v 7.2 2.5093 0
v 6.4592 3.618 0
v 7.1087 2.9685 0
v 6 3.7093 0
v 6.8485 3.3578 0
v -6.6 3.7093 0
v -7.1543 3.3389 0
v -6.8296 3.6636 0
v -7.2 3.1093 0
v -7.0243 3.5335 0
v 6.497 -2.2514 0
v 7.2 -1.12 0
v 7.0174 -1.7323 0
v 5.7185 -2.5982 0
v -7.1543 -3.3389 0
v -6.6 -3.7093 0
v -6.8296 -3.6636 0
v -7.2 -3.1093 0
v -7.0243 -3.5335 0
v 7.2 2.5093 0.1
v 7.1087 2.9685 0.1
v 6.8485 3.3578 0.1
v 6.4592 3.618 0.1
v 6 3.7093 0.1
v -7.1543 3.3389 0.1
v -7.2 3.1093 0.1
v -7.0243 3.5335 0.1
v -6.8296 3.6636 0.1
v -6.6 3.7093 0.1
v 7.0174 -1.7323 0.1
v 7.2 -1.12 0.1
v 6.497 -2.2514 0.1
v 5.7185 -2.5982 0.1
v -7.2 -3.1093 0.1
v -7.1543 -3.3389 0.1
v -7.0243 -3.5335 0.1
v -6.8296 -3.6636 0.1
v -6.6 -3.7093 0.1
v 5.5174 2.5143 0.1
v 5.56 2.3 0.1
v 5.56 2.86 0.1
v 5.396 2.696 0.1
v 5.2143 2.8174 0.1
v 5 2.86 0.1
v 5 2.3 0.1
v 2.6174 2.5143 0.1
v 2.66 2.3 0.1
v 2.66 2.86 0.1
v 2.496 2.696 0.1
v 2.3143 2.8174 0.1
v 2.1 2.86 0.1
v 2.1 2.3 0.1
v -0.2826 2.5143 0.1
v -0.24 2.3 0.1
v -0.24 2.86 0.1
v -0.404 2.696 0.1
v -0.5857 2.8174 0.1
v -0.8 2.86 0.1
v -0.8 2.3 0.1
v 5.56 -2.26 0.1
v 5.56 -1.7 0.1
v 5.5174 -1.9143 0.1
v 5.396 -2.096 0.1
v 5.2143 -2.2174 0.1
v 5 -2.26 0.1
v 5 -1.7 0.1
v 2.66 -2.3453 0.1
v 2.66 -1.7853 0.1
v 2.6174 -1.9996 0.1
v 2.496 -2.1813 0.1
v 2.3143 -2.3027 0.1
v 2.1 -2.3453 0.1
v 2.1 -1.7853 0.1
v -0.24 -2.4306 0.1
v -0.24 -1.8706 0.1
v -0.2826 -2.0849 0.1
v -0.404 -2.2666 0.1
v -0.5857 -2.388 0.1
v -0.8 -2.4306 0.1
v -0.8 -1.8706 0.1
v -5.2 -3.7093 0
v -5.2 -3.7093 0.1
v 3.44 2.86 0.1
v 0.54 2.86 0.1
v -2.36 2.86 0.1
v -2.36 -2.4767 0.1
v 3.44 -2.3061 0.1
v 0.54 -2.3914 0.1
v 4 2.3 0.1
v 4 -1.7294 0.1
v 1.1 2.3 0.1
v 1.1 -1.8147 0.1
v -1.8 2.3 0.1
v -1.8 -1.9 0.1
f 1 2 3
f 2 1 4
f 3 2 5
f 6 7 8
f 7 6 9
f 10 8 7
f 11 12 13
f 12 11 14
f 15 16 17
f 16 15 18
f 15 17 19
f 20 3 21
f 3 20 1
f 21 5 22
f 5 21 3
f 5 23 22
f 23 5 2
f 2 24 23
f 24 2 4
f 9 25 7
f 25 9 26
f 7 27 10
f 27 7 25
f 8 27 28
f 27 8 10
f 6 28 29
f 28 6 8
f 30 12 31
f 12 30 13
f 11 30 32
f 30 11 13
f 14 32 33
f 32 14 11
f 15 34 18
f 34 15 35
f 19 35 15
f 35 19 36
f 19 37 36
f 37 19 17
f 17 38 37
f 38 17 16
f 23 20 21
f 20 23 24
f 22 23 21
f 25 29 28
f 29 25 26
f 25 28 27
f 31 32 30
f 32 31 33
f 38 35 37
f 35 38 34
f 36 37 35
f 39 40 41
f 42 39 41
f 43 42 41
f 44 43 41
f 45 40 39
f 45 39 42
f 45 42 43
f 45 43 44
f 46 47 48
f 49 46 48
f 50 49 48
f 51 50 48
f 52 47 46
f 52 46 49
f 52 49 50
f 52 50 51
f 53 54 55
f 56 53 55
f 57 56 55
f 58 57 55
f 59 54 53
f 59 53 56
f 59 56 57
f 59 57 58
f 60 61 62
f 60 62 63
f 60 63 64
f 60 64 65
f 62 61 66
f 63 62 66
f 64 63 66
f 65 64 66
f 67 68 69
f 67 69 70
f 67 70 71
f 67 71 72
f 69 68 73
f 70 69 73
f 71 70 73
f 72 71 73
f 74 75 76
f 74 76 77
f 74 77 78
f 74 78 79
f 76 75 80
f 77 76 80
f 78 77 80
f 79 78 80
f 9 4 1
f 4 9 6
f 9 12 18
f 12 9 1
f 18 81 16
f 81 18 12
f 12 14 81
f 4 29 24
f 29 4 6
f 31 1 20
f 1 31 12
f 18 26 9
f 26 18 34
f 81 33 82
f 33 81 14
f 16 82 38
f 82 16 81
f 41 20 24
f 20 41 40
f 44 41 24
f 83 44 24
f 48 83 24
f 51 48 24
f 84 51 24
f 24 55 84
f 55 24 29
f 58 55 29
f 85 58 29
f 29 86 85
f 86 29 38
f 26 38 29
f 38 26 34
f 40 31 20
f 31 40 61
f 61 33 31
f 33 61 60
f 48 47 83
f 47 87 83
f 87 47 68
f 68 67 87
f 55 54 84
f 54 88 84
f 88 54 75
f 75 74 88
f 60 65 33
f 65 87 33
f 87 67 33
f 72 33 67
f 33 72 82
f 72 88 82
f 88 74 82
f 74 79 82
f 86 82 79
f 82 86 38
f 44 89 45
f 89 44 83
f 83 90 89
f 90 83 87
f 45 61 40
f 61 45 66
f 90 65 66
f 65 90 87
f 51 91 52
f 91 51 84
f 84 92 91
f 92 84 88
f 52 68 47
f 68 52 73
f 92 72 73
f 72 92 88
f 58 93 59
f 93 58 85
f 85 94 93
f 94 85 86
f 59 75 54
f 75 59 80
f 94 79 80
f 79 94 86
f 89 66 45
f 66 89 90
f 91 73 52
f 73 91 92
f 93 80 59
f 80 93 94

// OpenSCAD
// file: ../p/3-16cyli.scad
use <../lib.scad>
function ldraw_lib__3_16cyli() = [
// 0 Cylinder 0.1875
// 0 Name: 3-16cyli.dat
// 0 Author: Mark Kennedy [mkennedy]
// 0 !LDRAW_ORG Primitive UPDATE 2005-01
// 0 !LICENSE Licensed under CC BY 4.0 : see CAreadme.txt
// 
// 0 BFC CERTIFY CCW
  [0,"BFC","CERTIFY"],
  [0,"BFC","CCW"],
// 
// 0 !HISTORY 2004-03-02 [PTadmin] Official Update 2004-01
// 0 !HISTORY 2004-12-11 [nielsk] Recreated using Primitive Generator, Edge lines fixed, BFC changed to CCW
// 0 !HISTORY 2005-12-28 [PTadmin] Official Update 2005-01
// 0 !HISTORY 2007-06-24 [PTadmin] Header formatted for Contributor Agreement
// 0 !HISTORY 2008-07-01 [PTadmin] Official Update 2008-01
// 
// 
// 4 16 .9239 1 .3827 .9239 0 .3827 1 0 0 1 1 0
  [4,16,.9239,1,.3827,.9239,0,.3827,1,0,0,1,1,0],
// 4 16 .7071 1 .7071 .7071 0 .7071 .9239 0 .3827 .9239 1 .3827
  [4,16,.7071,1,.7071,.7071,0,.7071,.9239,0,.3827,.9239,1,.3827],
// 4 16 .3827 1 .9239 .3827 0 .9239 .7071 0 .7071 .7071 1 .7071
  [4,16,.3827,1,.9239,.3827,0,.9239,.7071,0,.7071,.7071,1,.7071],
// 5 24 1 1 0 1 0 0 1 1 -.4142 .9239 1 .3827
  [5,24,1,1,0,1,0,0,1,1,-.4142,.9239,1,.3827],
// 5 24 .9239 1 .3827 .9239 0 .3827 1 1 0 .7071 1 .7071
  [5,24,.9239,1,.3827,.9239,0,.3827,1,1,0,.7071,1,.7071],
// 5 24 .7071 1 .7071 .7071 0 .7071 .9239 1 .3827 .3827 1 .9239
  [5,24,.7071,1,.7071,.7071,0,.7071,.9239,1,.3827,.3827,1,.9239],
// 5 24 .3827 1 .9239 .3827 0 .9239 .7071 1 .7071 0 1 1.0824
  [5,24,.3827,1,.9239,.3827,0,.9239,.7071,1,.7071,0,1,1.0824],
// 0
];
module ldraw_lib__3_16cyli(step=0, col=false, unit=2/5, alt=false, line=0.2, solid=!$preview)
    makepoly(ldraw_lib__3_16cyli(), step=step, col=col, unit=unit, alt=alt, line=line, solid=solid);
ldraw_lib__3_16cyli(line=0.2);
// file: ../p/3-16chrd.scad
use <../lib.scad>
function ldraw_lib__3_16chrd() = [
// 0 Chord 0.1875
// 0 Name: 3-16chrd.dat
// 0 Author: Niels Karsdorp [nielsk]
// 0 !LDRAW_ORG Primitive UPDATE 2009-01
// 0 !LICENSE Licensed under CC BY 4.0 : see CAreadme.txt
// 
// 0 BFC CERTIFY CCW
  [0,"BFC","CERTIFY"],
  [0,"BFC","CCW"],
// 
// 0 !HISTORY 2009-05-02 [PTadmin] Official Update 2009-01
// 
// 
// 4 16 1 0 0 0.9239 0 0.3827 0.7071 0 0.7071 0.3827 0 0.9239
  [4,16,1,0,0,0.9239,0,0.3827,0.7071,0,0.7071,0.3827,0,0.9239],
// 0
// 
];
module ldraw_lib__3_16chrd(step=0, col=false, unit=2/5, alt=false, line=0.2, solid=!$preview)
    makepoly(ldraw_lib__3_16chrd(), step=step, col=col, unit=unit, alt=alt, line=line, solid=solid);
ldraw_lib__3_16chrd(line=0.2);
// file: ../p/1-4ndis.scad
use <../lib.scad>
function ldraw_lib__1_4ndis() = [
// 0 Disc Negative 0.25
// 0 Name: 1-4ndis.dat
// 0 Author: James Jessiman
// 0 !LDRAW_ORG Primitive UPDATE 2012-01
// 0 !LICENSE Licensed under CC BY 4.0 : see CAreadme.txt
// 
// 0 BFC CERTIFY CCW
  [0,"BFC","CERTIFY"],
  [0,"BFC","CCW"],
// 
// 0 !HISTORY 2002-03-23 [sbliss] Added BFC Statement
// 0 !HISTORY 2002-04-25 [PTadmin] Official Update 2002-02
// 0 !HISTORY 2007-06-22 [PTadmin] Header formatted for Contributor Agreement
// 0 !HISTORY 2008-07-01 [PTadmin] Official Update 2008-01
// 0 !HISTORY 2012-02-16 [Philo] Changed to CCW
// 0 !HISTORY 2012-03-30 [PTadmin] Official Update 2012-01
// 
// 
// 3 16 0.9239 0 0.3827 1 0 0 1 0 1
  [3,16,0.9239,0,0.3827,1,0,0,1,0,1],
// 3 16 0.7071 0 0.7071 0.9239 0 0.3827 1 0 1
  [3,16,0.7071,0,0.7071,0.9239,0,0.3827,1,0,1],
// 3 16 0.3827 0 0.9239 0.7071 0 0.7071 1 0 1
  [3,16,0.3827,0,0.9239,0.7071,0,0.7071,1,0,1],
// 3 16 0 0 1 0.3827 0 0.9239 1 0 1
  [3,16,0,0,1,0.3827,0,0.9239,1,0,1],
];
module ldraw_lib__1_4ndis(step=0, col=false, unit=2/5, alt=false, line=0.2, solid=!$preview)
    makepoly(ldraw_lib__1_4ndis(), step=step, col=col, unit=unit, alt=alt, line=line, solid=solid);
ldraw_lib__1_4ndis(line=0.2);
// file: ../p/1-4disc.scad
use <../lib.scad>
function ldraw_lib__1_4disc() = [
// 0 Disc 0.25
// 0 Name: 1-4disc.dat
// 0 Author: James Jessiman
// 0 !LDRAW_ORG Primitive UPDATE 2002-02
// 0 !LICENSE Licensed under CC BY 4.0 : see CAreadme.txt
// 
// 0 BFC CERTIFY CCW
  [0,"BFC","CERTIFY"],
  [0,"BFC","CCW"],
// 
// 0 !HISTORY 2002-03-23 [sbliss] Added BFC statement.
// 0 !HISTORY 2002-04-25 [PTadmin] Official Update 2002-02
// 0 !HISTORY 2007-06-22 [PTadmin] Header formatted for Contributor Agreement
// 0 !HISTORY 2008-07-01 [PTadmin] Official Update 2008-01
// 
// 
// 3 16 0 0 0 1 0 0 0.9239 0 0.3827
  [3,16,0,0,0,1,0,0,0.9239,0,0.3827],
// 3 16 0 0 0 0.9239 0 0.3827 0.7071 0 0.7071
  [3,16,0,0,0,0.9239,0,0.3827,0.7071,0,0.7071],
// 3 16 0 0 0 0.7071 0 0.7071 0.3827 0 0.9239
  [3,16,0,0,0,0.7071,0,0.7071,0.3827,0,0.9239],
// 3 16 0 0 0 0.3827 0 0.9239 0 0 1
  [3,16,0,0,0,0.3827,0,0.9239,0,0,1],
// 0
];
module ldraw_lib__1_4disc(step=0, col=false, unit=2/5, alt=false, line=0.2, solid=!$preview)
    makepoly(ldraw_lib__1_4disc(), step=step, col=col, unit=unit, alt=alt, line=line, solid=solid);
ldraw_lib__1_4disc(line=0.2);
// file: ../p/1-4cyli.scad
use <../lib.scad>
function ldraw_lib__1_4cyli() = [
// 0 Cylinder 0.25
// 0 Name: 1-4cyli.dat
// 0 Author: James Jessiman
// 0 !LDRAW_ORG Primitive UPDATE 2012-01
// 0 !LICENSE Licensed under CC BY 4.0 : see CAreadme.txt
// 
// 0 BFC CERTIFY CCW
  [0,"BFC","CERTIFY"],
  [0,"BFC","CCW"],
// 
// 0 !HISTORY 2002-03-23 [sbliss] Added BFC statement.
// 0 !HISTORY 2002-04-25 [PTadmin] Official Update 2002-02
// 0 !HISTORY 2007-06-22 [PTadmin] Header formatted for Contributor Agreement
// 0 !HISTORY 2008-07-01 [PTadmin] Official Update 2008-01
// 0 !HISTORY 2012-02-16 [Philo] Changed to CCW
// 0 !HISTORY 2012-03-30 [PTadmin] Official Update 2012-01
// 
// 
// 4 16 1 1 0 0.9239 1 0.3827 0.9239 0 0.3827 1 0 0
  [4,16,1,1,0,0.9239,1,0.3827,0.9239,0,0.3827,1,0,0],
// 5 24 1 0 0 1 1 0 0.9239 0 0.3827 1 0 -1
  [5,24,1,0,0,1,1,0,0.9239,0,0.3827,1,0,-1],
// 4 16 0.9239 1 0.3827 0.7071 1 0.7071 0.7071 0 0.7071 0.9239 0 0.3827
  [4,16,0.9239,1,0.3827,0.7071,1,0.7071,0.7071,0,0.7071,0.9239,0,0.3827],
// 5 24 0.9239 0 0.3827 0.9239 1 0.3827 0.7071 0 0.7071 1 0 0
  [5,24,0.9239,0,0.3827,0.9239,1,0.3827,0.7071,0,0.7071,1,0,0],
// 4 16 0.7071 1 0.7071 0.3827 1 0.9239 0.3827 0 0.9239 0.7071 0 0.7071
  [4,16,0.7071,1,0.7071,0.3827,1,0.9239,0.3827,0,0.9239,0.7071,0,0.7071],
// 5 24 0.7071 0 0.7071 0.7071 1 0.7071 0.3827 0 0.9239 0.9239 0 0.3827
  [5,24,0.7071,0,0.7071,0.7071,1,0.7071,0.3827,0,0.9239,0.9239,0,0.3827],
// 4 16 0.3827 1 0.9239 0 1 1 0 0 1 0.3827 0 0.9239
  [4,16,0.3827,1,0.9239,0,1,1,0,0,1,0.3827,0,0.9239],
// 5 24 0.3827 0 0.9239 0.3827 1 0.9239 0 0 1 0.7071 0 0.7071
  [5,24,0.3827,0,0.9239,0.3827,1,0.9239,0,0,1,0.7071,0,0.7071],
// 5 24 0 0 1 0 1 1 0.3827 0 0.9239 -1 0 1
  [5,24,0,0,1,0,1,1,0.3827,0,0.9239,-1,0,1],
];
module ldraw_lib__1_4cyli(step=0, col=false, unit=2/5, alt=false, line=0.2, solid=!$preview)
    makepoly(ldraw_lib__1_4cyli(), step=step, col=col, unit=unit, alt=alt, line=line, solid=solid);
ldraw_lib__1_4cyli(line=0.2);
// file: ../p/1-4chrd.scad
use <../lib.scad>
function ldraw_lib__1_4chrd() = [
// 0 Chord 0.25
// 0 Name: 1-4chrd.dat
// 0 Author: Max Martin Richter [MMR1988]
// 0 !LDRAW_ORG Primitive UPDATE 2023-05
// 0 !LICENSE Licensed under CC BY 4.0 : see CAreadme.txt
// 
// 0 BFC CERTIFY CCW
  [0,"BFC","CERTIFY"],
  [0,"BFC","CCW"],
// 
// 0 !HISTORY 2004-04-22 [PTadmin] Official Update 2004-02
// 0 !HISTORY 2007-10-09 [PTadmin] Header formatted for Contributor Agreement
// 0 !HISTORY 2008-07-01 [PTadmin] Official Update 2008-01
// 0 !HISTORY 2012-08-02 [MMR1988] Re-creation with PrimGen2 and Rectifier
// 0 !HISTORY 2012-08-09 [PTadmin] Official Update 2012-02
// 0 !HISTORY 2023-10-27 [OrionP] Change author to MMR1988 from hafhead
// 0 !HISTORY 2023-10-31 [OrionP] Official Update 2023-05
// 
// 4 16 0.9239 0 0.3827 0.3827 0 0.9239 0 0 1 1 0 0
  [4,16,0.9239,0,0.3827,0.3827,0,0.9239,0,0,1,1,0,0],
// 3 16 0.7071 0 0.7071 0.3827 0 0.9239 0.9239 0 0.3827
  [3,16,0.7071,0,0.7071,0.3827,0,0.9239,0.9239,0,0.3827],
];
module ldraw_lib__1_4chrd(step=0, col=false, unit=2/5, alt=false, line=0.2, solid=!$preview)
    makepoly(ldraw_lib__1_4chrd(), step=step, col=col, unit=unit, alt=alt, line=line, solid=solid);
ldraw_lib__1_4chrd(line=0.2);
// main file
use <../lib.scad>
use <6141955m.scad>
function ldraw_lib__6141955o() = [
// 0 Sticker  1 x  1.8 with Red Taillamp on Black Background Right
// 0 Name: 6141955o.dat
// 0 Author: Massimo Maso [Sirio]
// 0 !LDRAW_ORG Part UPDATE 2024-07
// 0 !LICENSE Licensed under CC BY 4.0 : see CAreadme.txt
// 
// 0 BFC CERTIFY CCW
  [0,"BFC","CERTIFY"],
  [0,"BFC","CCW"],
// 
// 0 !KEYWORDS Ford, GT, Mustang, Set 75871, Speed Champions
// 
// 0 !HISTORY 2024-08-26 [OrionP] Official Update 2024-07
// 
// 
// 1 16 0 0 0 -1 0 0 0 1 0 0 0 1 6141955m.dat
  [1,16,0,0,0,-1,0,0,0,1,0,0,0,1, ldraw_lib__6141955m()],
// 
];
module ldraw_lib__6141955o(step=0, col=false, unit=2/5, alt=false, line=0.2, solid=!$preview)
    makepoly(ldraw_lib__6141955o(), step=step, col=col, unit=unit, alt=alt, line=line, solid=solid);
ldraw_lib__6141955o(line=0.2);
